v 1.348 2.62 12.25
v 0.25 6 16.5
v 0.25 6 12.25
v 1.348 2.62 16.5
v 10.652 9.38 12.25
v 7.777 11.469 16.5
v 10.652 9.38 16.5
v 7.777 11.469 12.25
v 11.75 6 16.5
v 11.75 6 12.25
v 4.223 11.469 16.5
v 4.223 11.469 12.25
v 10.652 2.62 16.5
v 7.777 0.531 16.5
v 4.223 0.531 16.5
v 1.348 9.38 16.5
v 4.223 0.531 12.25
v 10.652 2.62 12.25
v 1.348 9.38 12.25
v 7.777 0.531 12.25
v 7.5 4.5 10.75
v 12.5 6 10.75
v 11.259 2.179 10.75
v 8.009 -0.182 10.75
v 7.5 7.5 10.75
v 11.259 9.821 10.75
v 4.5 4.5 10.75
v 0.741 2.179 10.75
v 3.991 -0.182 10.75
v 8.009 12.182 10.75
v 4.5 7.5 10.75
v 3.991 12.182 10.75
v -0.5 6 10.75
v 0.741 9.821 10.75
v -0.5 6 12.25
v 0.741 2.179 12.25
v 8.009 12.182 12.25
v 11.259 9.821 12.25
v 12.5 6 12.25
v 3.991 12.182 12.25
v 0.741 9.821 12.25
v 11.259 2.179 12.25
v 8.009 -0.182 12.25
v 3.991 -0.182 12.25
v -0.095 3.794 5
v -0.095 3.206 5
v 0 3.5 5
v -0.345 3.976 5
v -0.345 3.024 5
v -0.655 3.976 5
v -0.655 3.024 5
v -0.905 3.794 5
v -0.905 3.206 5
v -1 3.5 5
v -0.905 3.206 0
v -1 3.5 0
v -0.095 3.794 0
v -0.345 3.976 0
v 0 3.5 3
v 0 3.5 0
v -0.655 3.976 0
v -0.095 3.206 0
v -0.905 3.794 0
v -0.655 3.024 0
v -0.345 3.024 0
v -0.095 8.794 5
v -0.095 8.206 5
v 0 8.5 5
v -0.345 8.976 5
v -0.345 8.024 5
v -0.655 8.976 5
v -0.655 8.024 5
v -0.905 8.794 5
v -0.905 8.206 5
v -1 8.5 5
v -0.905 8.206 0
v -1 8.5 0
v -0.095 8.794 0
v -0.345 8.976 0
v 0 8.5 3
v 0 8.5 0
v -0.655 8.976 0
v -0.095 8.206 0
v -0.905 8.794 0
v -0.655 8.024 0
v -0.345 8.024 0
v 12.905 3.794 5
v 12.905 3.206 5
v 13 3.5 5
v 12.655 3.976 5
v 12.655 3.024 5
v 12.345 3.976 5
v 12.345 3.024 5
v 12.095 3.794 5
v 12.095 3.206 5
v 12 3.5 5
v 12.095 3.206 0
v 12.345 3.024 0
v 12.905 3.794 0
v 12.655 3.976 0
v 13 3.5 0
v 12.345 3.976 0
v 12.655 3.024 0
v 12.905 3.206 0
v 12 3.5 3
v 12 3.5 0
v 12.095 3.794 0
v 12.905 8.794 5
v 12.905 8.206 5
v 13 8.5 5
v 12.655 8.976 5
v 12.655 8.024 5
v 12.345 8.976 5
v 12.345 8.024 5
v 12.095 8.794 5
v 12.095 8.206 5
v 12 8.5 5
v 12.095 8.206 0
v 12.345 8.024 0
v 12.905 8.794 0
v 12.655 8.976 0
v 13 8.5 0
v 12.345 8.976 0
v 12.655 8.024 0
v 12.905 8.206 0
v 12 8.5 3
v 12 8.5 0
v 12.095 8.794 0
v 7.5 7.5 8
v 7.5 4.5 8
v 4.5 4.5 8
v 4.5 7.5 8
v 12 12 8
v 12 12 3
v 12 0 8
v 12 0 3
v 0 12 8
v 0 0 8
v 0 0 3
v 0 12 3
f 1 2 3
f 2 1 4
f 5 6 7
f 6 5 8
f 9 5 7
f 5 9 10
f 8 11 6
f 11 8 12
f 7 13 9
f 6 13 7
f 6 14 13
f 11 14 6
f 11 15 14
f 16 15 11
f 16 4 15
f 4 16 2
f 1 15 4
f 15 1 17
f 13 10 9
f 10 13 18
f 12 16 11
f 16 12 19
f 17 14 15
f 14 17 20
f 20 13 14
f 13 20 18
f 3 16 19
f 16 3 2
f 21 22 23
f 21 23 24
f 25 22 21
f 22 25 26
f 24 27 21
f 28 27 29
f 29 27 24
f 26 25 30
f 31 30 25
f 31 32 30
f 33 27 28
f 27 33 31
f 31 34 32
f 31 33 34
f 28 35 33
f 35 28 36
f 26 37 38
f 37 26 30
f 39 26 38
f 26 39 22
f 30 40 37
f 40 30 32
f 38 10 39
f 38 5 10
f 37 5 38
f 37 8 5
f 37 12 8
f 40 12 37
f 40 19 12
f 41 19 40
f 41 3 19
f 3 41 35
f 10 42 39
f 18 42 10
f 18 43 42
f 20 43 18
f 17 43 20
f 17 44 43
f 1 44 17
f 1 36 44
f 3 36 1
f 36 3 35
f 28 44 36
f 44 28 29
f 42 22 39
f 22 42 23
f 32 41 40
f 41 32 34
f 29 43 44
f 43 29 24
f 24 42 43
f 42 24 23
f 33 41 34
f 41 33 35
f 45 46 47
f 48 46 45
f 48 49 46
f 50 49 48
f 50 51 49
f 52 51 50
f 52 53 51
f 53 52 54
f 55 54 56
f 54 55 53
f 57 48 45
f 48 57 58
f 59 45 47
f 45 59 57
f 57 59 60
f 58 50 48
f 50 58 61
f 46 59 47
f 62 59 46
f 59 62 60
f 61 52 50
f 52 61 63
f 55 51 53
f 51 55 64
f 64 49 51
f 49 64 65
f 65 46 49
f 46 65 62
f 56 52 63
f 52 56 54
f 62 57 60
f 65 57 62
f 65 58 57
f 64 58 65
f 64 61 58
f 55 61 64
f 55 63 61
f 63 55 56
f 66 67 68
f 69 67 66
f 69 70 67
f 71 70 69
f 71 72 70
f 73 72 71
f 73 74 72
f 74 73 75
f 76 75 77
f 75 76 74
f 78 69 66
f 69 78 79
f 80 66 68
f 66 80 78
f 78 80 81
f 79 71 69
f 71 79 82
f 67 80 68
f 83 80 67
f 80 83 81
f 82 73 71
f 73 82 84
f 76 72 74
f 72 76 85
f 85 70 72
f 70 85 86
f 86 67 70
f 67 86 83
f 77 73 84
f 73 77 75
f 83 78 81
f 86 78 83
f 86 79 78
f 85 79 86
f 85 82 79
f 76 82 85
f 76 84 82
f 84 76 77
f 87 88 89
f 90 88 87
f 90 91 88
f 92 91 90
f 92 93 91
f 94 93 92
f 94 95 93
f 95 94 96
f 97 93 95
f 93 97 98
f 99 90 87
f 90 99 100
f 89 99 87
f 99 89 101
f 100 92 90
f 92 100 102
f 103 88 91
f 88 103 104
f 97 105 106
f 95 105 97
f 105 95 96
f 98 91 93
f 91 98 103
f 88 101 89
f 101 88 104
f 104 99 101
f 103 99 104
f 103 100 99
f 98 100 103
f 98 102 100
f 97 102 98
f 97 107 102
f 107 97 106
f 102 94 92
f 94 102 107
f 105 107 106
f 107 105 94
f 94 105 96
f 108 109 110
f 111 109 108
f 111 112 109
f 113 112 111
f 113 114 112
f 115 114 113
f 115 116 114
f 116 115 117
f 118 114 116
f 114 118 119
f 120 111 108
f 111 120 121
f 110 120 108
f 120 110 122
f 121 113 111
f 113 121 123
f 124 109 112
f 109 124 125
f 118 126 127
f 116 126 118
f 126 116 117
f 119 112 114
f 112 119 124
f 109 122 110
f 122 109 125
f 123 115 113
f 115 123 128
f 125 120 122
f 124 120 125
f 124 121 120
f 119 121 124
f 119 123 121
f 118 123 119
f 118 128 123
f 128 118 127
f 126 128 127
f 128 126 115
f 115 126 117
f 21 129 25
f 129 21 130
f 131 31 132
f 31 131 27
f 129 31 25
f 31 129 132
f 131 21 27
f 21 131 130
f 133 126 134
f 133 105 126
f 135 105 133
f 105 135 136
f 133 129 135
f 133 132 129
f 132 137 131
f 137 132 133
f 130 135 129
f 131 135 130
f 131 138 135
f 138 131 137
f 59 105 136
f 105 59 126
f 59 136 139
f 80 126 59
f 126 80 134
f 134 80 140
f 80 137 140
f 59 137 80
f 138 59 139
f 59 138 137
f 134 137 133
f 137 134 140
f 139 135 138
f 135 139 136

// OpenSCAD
$fn=10;

button();

module button() {
	overall_width=12;
	overall_thickness=16.5;

	cap();
	neck();
	base();
	legs();

	module cap() {
		cap_d1=11.5;
		cap_d2=13;
		cap_height1=5.75;
		cap_height2=1.5;

		translate([overall_width/2,overall_width/2,overall_thickness-cap_height1])
		union() {
			cylinder(d=cap_d1, h=cap_height1);
			cylinder(d=cap_d2, h=cap_height2);
		}
	}

	module neck() {
		width=3;
		translate([overall_width/2-width/2,overall_width/2-width/2,5])
		cube([width,width,overall_thickness-5]);
	}

	module base() {
		thickness=5;
		translate([0,0,3])
		cube([overall_width,overall_width,thickness]);
	}

	module legs() {
		thickness=3;
		translate([-0.5,3.5,0])
		cylinder(d=1, h=thickness+2);
		translate([-0.5,overall_width-3.5,0])
		cylinder(d=1, h=thickness+2);

		translate([overall_width+0.5,3.5,0])
		cylinder(d=1, h=thickness+2);
		translate([overall_width+0.5,overall_width-3.5,0])
		cylinder(d=1, h=thickness+2);
	}
}
